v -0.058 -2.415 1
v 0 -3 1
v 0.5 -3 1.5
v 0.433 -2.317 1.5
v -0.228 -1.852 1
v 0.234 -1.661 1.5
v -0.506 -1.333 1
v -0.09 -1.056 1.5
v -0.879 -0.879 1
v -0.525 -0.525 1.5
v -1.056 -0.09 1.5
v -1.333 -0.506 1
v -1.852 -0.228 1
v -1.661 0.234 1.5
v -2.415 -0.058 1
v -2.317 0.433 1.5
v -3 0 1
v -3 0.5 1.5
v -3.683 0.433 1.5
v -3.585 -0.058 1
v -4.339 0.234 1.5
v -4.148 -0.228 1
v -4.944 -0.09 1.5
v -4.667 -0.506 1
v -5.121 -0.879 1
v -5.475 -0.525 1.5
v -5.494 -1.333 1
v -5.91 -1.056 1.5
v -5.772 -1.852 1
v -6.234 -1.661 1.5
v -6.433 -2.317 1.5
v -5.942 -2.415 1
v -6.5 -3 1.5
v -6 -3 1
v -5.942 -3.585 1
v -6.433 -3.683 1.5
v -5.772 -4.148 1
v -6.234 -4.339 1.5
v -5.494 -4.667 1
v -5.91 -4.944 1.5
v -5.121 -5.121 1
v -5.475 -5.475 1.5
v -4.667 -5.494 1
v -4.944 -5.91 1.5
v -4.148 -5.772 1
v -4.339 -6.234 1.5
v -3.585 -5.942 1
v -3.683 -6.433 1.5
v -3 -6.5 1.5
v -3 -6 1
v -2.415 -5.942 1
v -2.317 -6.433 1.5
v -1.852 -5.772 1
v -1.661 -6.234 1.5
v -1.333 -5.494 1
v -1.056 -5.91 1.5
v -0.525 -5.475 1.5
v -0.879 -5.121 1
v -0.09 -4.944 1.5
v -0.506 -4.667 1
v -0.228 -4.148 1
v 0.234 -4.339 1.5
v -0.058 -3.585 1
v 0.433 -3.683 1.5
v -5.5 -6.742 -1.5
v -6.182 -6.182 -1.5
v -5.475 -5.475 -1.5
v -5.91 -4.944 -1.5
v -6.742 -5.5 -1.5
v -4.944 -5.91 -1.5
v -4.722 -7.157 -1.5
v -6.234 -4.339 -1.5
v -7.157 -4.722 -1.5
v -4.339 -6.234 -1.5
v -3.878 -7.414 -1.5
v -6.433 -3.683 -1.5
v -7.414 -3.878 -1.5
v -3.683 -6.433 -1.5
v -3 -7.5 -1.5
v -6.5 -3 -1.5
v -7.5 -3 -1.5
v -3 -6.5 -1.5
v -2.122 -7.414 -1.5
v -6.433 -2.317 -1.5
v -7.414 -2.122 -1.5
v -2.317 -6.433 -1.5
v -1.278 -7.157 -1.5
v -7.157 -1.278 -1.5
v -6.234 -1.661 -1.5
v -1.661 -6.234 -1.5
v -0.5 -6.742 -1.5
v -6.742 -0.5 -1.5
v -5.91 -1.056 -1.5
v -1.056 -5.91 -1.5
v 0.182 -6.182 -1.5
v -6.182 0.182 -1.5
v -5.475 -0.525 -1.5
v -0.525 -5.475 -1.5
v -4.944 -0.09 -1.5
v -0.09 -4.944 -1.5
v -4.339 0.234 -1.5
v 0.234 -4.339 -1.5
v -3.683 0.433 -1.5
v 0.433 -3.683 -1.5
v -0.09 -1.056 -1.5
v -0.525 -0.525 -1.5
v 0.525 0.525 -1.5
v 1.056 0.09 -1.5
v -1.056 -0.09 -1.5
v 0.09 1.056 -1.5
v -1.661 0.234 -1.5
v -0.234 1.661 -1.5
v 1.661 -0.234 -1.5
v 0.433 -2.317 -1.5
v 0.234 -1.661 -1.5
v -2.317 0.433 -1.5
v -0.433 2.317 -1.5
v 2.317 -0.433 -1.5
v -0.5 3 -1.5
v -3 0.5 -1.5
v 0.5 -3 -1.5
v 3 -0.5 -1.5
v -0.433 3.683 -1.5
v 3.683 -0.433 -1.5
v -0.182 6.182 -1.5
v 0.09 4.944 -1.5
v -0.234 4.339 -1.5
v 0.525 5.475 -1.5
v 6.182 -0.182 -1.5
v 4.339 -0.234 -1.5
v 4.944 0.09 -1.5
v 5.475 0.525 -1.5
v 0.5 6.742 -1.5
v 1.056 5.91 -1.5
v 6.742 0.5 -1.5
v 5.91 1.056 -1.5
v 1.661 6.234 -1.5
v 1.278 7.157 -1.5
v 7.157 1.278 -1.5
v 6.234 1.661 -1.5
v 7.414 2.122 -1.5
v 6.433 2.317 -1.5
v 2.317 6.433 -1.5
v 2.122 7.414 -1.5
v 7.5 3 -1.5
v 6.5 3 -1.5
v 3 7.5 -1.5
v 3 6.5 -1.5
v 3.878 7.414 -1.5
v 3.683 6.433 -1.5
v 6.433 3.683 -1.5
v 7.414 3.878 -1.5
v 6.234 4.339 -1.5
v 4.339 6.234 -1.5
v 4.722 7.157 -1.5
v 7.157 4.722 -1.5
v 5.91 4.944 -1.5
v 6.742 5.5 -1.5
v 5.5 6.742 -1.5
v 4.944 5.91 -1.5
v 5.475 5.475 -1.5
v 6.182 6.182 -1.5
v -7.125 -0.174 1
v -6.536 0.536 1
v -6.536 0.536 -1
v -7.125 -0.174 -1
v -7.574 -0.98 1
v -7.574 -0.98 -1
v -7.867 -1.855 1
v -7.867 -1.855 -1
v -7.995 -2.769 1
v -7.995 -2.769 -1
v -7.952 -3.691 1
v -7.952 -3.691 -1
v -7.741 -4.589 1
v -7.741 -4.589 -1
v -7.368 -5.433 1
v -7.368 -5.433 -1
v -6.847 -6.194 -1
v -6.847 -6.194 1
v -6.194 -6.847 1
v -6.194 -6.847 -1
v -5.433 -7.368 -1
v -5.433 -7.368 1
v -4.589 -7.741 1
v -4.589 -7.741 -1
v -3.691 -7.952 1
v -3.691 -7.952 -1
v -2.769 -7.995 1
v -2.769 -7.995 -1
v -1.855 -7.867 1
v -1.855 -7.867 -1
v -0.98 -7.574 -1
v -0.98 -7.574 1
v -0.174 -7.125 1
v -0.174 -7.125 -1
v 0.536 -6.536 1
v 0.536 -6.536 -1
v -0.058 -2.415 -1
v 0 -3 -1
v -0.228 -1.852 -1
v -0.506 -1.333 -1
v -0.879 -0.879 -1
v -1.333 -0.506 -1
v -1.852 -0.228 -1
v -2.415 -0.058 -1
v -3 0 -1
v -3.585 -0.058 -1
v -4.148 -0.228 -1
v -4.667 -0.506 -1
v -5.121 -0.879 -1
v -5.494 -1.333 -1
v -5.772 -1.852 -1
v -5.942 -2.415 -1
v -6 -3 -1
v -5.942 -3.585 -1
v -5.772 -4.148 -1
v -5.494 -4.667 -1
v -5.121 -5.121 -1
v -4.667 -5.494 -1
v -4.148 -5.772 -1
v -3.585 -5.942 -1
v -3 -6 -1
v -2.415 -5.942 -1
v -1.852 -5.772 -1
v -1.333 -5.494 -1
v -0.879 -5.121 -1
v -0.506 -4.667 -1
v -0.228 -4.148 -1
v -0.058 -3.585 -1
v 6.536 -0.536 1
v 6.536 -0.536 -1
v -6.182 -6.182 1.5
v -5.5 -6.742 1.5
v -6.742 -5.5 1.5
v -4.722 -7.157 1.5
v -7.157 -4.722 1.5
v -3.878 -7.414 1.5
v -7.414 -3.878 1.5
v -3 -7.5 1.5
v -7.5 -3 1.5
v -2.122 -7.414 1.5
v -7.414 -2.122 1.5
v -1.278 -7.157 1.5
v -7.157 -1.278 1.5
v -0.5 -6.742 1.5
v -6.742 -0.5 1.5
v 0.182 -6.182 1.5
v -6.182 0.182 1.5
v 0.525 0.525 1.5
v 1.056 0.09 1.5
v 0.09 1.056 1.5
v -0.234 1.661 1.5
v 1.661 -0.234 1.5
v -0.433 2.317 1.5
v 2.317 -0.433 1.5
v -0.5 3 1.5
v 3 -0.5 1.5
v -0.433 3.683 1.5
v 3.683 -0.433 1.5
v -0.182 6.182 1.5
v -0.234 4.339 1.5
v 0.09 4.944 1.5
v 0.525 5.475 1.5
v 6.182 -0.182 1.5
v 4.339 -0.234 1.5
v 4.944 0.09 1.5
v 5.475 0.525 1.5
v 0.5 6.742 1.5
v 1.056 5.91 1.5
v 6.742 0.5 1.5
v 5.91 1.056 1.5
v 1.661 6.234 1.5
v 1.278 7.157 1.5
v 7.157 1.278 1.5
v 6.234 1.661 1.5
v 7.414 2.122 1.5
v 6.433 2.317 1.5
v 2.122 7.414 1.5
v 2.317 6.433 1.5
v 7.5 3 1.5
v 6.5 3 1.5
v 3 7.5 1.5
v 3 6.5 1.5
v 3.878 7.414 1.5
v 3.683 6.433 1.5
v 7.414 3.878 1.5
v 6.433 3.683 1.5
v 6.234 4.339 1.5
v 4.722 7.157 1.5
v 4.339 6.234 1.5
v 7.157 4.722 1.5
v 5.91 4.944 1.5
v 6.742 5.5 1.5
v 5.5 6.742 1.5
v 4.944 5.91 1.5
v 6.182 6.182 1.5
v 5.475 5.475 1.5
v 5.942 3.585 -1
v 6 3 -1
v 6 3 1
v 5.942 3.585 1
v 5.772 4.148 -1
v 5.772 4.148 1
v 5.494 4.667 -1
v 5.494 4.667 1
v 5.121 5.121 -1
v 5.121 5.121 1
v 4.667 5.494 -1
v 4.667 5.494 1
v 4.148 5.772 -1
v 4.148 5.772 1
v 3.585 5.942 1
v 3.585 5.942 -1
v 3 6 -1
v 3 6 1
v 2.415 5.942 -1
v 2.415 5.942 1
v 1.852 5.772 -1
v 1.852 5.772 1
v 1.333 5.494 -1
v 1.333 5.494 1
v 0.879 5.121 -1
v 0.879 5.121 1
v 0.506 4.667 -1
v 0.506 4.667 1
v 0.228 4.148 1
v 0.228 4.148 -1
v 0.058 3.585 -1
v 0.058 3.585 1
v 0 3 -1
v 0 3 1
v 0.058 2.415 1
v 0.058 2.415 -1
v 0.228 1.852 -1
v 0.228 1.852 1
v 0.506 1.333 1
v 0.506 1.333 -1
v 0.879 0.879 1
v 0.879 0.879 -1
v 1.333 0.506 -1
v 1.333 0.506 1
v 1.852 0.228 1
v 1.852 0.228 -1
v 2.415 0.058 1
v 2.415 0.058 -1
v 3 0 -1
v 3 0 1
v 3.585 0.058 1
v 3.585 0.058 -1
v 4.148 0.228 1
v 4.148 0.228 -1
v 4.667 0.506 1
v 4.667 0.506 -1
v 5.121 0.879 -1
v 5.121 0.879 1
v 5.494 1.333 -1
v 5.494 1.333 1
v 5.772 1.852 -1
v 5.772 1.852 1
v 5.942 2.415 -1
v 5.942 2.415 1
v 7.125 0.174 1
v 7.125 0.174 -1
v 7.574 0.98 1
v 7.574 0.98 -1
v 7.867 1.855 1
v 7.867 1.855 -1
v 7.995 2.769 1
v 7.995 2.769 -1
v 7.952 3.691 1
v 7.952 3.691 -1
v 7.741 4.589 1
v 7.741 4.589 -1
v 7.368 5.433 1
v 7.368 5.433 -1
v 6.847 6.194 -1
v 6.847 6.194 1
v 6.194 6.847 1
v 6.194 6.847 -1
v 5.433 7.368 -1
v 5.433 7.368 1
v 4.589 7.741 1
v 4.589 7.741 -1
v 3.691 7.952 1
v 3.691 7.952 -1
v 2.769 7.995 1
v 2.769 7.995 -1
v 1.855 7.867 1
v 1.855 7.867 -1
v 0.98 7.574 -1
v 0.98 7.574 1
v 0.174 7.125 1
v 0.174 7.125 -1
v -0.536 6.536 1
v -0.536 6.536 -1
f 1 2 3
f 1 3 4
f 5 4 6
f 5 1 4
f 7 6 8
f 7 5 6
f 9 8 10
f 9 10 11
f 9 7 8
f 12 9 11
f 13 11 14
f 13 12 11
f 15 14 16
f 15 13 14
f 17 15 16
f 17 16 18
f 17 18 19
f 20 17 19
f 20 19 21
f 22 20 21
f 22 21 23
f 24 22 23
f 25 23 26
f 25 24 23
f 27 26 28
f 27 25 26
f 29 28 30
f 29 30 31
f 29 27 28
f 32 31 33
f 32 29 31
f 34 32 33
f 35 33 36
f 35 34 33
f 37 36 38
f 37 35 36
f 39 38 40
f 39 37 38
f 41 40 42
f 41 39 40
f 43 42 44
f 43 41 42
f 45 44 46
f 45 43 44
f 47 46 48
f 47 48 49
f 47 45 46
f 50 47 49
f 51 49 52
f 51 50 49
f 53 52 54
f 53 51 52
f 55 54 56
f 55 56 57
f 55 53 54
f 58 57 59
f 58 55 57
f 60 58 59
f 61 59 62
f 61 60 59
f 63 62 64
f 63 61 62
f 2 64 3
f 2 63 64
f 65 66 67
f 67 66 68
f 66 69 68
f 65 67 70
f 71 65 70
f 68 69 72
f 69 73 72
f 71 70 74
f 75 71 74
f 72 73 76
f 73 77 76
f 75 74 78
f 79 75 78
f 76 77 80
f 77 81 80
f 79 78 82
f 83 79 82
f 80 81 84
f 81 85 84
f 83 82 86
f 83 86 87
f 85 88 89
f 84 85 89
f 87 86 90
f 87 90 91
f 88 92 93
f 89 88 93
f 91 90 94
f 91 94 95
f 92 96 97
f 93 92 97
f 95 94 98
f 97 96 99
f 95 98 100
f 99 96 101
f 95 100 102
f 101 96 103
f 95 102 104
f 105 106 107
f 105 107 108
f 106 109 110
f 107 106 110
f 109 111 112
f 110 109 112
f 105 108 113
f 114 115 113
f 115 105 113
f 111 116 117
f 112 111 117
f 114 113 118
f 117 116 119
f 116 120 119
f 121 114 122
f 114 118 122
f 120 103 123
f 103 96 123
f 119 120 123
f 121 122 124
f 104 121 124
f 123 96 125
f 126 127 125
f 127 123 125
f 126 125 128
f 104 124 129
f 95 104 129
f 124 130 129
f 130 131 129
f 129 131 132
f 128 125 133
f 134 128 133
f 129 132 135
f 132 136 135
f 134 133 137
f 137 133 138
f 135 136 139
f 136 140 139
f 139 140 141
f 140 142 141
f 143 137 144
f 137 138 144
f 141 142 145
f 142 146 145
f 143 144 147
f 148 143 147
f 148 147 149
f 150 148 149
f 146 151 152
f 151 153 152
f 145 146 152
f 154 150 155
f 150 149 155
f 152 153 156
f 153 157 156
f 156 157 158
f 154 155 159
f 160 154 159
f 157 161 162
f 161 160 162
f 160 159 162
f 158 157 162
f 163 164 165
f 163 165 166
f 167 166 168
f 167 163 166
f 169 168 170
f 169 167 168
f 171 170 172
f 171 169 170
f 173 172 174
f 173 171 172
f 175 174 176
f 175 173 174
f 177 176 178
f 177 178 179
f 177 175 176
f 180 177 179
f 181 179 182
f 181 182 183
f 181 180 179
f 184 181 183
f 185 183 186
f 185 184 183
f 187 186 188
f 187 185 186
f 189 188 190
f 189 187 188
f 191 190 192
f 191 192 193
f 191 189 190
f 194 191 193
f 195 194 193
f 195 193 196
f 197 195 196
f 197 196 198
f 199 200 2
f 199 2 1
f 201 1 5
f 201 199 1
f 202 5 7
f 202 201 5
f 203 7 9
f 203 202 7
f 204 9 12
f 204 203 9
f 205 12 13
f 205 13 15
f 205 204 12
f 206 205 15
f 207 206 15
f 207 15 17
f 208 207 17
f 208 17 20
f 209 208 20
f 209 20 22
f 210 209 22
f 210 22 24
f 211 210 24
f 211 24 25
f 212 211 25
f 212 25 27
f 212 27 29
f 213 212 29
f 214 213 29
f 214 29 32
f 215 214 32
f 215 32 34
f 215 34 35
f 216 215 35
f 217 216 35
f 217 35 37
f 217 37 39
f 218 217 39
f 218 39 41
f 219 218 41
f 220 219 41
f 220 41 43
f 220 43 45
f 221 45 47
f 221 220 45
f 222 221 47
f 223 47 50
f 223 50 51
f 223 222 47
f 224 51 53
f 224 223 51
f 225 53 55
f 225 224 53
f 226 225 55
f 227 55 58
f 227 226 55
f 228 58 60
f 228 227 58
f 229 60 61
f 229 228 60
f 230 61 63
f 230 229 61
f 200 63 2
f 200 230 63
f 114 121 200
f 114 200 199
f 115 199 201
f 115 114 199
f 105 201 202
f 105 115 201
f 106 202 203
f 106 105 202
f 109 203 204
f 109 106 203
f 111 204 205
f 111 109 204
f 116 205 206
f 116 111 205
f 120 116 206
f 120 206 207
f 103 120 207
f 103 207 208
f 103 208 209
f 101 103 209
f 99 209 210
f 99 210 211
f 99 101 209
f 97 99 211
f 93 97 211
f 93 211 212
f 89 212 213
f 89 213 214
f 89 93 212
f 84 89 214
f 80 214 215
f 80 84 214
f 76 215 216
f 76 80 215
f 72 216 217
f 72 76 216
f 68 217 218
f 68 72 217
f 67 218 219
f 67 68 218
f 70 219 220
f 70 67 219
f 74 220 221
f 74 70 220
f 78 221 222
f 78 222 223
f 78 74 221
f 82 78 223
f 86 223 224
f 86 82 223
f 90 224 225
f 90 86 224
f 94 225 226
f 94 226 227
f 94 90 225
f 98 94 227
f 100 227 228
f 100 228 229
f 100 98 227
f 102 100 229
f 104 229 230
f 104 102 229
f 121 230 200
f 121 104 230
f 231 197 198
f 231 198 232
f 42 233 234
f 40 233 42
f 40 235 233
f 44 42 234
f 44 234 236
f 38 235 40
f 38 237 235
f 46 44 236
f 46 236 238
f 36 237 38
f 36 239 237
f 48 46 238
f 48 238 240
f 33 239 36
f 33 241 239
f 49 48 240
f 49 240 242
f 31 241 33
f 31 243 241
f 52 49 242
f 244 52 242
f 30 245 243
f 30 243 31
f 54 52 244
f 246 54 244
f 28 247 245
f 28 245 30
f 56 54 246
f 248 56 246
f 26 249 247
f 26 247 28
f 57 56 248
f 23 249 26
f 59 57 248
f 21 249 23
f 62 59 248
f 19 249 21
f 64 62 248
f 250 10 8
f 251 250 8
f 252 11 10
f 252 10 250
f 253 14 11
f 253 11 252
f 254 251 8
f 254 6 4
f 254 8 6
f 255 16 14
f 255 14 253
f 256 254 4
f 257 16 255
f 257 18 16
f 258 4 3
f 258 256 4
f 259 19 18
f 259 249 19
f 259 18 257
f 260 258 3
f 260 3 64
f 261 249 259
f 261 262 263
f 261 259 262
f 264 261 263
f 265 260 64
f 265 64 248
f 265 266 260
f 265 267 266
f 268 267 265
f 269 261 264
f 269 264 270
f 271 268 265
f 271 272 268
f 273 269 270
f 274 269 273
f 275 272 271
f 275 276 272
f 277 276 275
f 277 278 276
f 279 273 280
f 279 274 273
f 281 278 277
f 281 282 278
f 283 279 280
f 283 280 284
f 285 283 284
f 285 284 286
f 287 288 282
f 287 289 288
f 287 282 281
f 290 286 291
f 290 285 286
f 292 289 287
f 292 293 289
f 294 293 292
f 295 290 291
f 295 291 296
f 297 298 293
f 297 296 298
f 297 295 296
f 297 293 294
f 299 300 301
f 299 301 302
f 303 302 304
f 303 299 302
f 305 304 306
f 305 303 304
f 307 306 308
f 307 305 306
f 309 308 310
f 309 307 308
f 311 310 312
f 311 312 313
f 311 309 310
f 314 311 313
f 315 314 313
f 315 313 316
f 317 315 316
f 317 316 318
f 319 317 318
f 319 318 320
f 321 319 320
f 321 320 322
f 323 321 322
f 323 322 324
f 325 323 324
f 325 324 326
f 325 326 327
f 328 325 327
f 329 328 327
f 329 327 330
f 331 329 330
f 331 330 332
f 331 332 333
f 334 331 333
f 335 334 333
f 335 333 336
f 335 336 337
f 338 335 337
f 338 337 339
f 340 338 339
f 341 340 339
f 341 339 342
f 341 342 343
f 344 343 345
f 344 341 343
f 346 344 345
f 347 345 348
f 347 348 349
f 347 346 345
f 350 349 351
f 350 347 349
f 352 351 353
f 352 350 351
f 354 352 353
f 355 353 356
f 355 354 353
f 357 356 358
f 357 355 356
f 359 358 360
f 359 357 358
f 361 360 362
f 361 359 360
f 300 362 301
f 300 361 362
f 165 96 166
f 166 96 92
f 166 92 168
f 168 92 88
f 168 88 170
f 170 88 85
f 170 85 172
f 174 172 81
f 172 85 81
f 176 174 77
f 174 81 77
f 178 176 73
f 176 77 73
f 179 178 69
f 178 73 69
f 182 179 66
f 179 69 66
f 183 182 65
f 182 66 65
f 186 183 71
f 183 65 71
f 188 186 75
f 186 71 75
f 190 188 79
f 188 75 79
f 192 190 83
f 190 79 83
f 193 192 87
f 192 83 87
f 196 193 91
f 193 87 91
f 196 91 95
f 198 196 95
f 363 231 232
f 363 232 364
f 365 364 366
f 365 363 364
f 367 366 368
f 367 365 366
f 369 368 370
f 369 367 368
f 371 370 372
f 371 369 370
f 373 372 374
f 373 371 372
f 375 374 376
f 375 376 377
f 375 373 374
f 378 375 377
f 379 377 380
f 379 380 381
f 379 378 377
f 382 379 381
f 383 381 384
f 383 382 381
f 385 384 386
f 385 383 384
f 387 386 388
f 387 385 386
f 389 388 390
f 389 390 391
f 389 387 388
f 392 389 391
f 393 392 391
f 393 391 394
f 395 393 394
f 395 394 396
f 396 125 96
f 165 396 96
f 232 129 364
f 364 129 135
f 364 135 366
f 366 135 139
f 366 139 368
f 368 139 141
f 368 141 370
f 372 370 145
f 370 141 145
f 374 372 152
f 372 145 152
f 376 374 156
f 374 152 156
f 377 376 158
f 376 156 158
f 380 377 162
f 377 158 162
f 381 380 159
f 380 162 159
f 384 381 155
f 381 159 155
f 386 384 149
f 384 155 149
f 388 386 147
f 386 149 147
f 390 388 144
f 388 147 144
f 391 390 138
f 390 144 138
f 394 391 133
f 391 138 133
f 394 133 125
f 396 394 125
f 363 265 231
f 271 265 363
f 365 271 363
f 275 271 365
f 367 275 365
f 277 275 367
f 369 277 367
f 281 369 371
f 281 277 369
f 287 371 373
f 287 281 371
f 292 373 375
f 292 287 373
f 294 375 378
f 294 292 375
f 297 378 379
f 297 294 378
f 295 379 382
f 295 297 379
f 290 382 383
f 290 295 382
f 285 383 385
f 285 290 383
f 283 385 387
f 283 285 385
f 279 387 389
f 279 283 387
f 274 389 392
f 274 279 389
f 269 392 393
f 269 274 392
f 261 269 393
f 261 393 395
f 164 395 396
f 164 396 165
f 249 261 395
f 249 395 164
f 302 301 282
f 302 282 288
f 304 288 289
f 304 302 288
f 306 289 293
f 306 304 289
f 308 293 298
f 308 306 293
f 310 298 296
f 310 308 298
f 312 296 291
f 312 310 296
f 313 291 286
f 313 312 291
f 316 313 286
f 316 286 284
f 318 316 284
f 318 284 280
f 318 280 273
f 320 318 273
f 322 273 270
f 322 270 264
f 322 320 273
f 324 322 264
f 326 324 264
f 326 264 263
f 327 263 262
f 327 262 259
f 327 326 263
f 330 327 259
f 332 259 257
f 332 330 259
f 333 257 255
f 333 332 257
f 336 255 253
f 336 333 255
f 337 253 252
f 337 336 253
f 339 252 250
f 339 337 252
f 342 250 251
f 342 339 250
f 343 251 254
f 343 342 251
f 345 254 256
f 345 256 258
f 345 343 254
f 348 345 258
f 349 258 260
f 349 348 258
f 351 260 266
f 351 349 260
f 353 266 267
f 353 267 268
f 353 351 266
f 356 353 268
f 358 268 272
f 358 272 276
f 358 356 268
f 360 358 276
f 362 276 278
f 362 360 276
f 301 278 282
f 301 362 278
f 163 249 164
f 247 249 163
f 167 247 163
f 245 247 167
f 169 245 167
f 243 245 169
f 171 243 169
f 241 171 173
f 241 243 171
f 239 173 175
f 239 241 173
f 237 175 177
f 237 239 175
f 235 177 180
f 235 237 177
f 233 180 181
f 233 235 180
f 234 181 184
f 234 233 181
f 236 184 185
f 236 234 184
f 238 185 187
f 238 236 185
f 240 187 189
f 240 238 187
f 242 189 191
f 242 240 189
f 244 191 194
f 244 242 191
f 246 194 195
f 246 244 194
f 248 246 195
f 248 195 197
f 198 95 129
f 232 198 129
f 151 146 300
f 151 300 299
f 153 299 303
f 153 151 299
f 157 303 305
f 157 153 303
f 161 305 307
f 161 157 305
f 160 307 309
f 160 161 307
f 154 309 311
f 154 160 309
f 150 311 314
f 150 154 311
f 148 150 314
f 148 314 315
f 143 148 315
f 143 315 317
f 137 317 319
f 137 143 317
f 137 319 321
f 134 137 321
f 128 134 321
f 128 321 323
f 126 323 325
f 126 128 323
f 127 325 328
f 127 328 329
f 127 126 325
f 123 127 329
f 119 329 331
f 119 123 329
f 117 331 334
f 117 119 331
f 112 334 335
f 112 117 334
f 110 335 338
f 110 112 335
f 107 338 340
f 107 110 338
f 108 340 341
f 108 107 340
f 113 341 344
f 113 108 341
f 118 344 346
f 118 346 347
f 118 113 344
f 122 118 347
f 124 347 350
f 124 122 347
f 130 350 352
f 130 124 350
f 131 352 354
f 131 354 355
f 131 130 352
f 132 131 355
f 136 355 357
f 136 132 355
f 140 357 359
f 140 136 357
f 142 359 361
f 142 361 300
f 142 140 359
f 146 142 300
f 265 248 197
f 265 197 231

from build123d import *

# Parameters (mm, degrees)
F0_R     = 3
F1_DEPTH = 1.5
F2_SIZE  = 0.5


with BuildPart() as f1:
    # F0 (on Top) → F1 (new body, symmetric)
    with BuildSketch(Plane.XY):
        with BuildLine():
            Line((0.535534, -6.535534), (6.535534, -0.535534))
            ThreePointArc((6.535534, -0.535534), (6.535534, 6.535534), (-0.535534, 6.535534))
            Line((-0.535534, 6.535534), (-6.535534, 0.535534))
            ThreePointArc((-6.535534, 0.535534), (-6.535534, -6.535534), (0.535534, -6.535534))
        make_face()
        with Locations((-3, -3)):
            Circle(F0_R, mode=Mode.SUBTRACT)
        with Locations((3, 3)):
            Circle(F0_R, mode=Mode.SUBTRACT)
    extrude(amount=F1_DEPTH, both=True)

    # F2
    f2_edges = [f1.edges().sort_by_distance(p)[0] for p in [
        (-6, -3, -1.5),
        (-6, -3, 1.5),
        (0, 3, -1.5),
        (3.535534, -3.535534, 1.5),
        (0, 3, 1.5),
        (3.535534, -3.535534, -1.5),
    ]]
    chamfer(f2_edges, length=F2_SIZE)


solid = f1.part
